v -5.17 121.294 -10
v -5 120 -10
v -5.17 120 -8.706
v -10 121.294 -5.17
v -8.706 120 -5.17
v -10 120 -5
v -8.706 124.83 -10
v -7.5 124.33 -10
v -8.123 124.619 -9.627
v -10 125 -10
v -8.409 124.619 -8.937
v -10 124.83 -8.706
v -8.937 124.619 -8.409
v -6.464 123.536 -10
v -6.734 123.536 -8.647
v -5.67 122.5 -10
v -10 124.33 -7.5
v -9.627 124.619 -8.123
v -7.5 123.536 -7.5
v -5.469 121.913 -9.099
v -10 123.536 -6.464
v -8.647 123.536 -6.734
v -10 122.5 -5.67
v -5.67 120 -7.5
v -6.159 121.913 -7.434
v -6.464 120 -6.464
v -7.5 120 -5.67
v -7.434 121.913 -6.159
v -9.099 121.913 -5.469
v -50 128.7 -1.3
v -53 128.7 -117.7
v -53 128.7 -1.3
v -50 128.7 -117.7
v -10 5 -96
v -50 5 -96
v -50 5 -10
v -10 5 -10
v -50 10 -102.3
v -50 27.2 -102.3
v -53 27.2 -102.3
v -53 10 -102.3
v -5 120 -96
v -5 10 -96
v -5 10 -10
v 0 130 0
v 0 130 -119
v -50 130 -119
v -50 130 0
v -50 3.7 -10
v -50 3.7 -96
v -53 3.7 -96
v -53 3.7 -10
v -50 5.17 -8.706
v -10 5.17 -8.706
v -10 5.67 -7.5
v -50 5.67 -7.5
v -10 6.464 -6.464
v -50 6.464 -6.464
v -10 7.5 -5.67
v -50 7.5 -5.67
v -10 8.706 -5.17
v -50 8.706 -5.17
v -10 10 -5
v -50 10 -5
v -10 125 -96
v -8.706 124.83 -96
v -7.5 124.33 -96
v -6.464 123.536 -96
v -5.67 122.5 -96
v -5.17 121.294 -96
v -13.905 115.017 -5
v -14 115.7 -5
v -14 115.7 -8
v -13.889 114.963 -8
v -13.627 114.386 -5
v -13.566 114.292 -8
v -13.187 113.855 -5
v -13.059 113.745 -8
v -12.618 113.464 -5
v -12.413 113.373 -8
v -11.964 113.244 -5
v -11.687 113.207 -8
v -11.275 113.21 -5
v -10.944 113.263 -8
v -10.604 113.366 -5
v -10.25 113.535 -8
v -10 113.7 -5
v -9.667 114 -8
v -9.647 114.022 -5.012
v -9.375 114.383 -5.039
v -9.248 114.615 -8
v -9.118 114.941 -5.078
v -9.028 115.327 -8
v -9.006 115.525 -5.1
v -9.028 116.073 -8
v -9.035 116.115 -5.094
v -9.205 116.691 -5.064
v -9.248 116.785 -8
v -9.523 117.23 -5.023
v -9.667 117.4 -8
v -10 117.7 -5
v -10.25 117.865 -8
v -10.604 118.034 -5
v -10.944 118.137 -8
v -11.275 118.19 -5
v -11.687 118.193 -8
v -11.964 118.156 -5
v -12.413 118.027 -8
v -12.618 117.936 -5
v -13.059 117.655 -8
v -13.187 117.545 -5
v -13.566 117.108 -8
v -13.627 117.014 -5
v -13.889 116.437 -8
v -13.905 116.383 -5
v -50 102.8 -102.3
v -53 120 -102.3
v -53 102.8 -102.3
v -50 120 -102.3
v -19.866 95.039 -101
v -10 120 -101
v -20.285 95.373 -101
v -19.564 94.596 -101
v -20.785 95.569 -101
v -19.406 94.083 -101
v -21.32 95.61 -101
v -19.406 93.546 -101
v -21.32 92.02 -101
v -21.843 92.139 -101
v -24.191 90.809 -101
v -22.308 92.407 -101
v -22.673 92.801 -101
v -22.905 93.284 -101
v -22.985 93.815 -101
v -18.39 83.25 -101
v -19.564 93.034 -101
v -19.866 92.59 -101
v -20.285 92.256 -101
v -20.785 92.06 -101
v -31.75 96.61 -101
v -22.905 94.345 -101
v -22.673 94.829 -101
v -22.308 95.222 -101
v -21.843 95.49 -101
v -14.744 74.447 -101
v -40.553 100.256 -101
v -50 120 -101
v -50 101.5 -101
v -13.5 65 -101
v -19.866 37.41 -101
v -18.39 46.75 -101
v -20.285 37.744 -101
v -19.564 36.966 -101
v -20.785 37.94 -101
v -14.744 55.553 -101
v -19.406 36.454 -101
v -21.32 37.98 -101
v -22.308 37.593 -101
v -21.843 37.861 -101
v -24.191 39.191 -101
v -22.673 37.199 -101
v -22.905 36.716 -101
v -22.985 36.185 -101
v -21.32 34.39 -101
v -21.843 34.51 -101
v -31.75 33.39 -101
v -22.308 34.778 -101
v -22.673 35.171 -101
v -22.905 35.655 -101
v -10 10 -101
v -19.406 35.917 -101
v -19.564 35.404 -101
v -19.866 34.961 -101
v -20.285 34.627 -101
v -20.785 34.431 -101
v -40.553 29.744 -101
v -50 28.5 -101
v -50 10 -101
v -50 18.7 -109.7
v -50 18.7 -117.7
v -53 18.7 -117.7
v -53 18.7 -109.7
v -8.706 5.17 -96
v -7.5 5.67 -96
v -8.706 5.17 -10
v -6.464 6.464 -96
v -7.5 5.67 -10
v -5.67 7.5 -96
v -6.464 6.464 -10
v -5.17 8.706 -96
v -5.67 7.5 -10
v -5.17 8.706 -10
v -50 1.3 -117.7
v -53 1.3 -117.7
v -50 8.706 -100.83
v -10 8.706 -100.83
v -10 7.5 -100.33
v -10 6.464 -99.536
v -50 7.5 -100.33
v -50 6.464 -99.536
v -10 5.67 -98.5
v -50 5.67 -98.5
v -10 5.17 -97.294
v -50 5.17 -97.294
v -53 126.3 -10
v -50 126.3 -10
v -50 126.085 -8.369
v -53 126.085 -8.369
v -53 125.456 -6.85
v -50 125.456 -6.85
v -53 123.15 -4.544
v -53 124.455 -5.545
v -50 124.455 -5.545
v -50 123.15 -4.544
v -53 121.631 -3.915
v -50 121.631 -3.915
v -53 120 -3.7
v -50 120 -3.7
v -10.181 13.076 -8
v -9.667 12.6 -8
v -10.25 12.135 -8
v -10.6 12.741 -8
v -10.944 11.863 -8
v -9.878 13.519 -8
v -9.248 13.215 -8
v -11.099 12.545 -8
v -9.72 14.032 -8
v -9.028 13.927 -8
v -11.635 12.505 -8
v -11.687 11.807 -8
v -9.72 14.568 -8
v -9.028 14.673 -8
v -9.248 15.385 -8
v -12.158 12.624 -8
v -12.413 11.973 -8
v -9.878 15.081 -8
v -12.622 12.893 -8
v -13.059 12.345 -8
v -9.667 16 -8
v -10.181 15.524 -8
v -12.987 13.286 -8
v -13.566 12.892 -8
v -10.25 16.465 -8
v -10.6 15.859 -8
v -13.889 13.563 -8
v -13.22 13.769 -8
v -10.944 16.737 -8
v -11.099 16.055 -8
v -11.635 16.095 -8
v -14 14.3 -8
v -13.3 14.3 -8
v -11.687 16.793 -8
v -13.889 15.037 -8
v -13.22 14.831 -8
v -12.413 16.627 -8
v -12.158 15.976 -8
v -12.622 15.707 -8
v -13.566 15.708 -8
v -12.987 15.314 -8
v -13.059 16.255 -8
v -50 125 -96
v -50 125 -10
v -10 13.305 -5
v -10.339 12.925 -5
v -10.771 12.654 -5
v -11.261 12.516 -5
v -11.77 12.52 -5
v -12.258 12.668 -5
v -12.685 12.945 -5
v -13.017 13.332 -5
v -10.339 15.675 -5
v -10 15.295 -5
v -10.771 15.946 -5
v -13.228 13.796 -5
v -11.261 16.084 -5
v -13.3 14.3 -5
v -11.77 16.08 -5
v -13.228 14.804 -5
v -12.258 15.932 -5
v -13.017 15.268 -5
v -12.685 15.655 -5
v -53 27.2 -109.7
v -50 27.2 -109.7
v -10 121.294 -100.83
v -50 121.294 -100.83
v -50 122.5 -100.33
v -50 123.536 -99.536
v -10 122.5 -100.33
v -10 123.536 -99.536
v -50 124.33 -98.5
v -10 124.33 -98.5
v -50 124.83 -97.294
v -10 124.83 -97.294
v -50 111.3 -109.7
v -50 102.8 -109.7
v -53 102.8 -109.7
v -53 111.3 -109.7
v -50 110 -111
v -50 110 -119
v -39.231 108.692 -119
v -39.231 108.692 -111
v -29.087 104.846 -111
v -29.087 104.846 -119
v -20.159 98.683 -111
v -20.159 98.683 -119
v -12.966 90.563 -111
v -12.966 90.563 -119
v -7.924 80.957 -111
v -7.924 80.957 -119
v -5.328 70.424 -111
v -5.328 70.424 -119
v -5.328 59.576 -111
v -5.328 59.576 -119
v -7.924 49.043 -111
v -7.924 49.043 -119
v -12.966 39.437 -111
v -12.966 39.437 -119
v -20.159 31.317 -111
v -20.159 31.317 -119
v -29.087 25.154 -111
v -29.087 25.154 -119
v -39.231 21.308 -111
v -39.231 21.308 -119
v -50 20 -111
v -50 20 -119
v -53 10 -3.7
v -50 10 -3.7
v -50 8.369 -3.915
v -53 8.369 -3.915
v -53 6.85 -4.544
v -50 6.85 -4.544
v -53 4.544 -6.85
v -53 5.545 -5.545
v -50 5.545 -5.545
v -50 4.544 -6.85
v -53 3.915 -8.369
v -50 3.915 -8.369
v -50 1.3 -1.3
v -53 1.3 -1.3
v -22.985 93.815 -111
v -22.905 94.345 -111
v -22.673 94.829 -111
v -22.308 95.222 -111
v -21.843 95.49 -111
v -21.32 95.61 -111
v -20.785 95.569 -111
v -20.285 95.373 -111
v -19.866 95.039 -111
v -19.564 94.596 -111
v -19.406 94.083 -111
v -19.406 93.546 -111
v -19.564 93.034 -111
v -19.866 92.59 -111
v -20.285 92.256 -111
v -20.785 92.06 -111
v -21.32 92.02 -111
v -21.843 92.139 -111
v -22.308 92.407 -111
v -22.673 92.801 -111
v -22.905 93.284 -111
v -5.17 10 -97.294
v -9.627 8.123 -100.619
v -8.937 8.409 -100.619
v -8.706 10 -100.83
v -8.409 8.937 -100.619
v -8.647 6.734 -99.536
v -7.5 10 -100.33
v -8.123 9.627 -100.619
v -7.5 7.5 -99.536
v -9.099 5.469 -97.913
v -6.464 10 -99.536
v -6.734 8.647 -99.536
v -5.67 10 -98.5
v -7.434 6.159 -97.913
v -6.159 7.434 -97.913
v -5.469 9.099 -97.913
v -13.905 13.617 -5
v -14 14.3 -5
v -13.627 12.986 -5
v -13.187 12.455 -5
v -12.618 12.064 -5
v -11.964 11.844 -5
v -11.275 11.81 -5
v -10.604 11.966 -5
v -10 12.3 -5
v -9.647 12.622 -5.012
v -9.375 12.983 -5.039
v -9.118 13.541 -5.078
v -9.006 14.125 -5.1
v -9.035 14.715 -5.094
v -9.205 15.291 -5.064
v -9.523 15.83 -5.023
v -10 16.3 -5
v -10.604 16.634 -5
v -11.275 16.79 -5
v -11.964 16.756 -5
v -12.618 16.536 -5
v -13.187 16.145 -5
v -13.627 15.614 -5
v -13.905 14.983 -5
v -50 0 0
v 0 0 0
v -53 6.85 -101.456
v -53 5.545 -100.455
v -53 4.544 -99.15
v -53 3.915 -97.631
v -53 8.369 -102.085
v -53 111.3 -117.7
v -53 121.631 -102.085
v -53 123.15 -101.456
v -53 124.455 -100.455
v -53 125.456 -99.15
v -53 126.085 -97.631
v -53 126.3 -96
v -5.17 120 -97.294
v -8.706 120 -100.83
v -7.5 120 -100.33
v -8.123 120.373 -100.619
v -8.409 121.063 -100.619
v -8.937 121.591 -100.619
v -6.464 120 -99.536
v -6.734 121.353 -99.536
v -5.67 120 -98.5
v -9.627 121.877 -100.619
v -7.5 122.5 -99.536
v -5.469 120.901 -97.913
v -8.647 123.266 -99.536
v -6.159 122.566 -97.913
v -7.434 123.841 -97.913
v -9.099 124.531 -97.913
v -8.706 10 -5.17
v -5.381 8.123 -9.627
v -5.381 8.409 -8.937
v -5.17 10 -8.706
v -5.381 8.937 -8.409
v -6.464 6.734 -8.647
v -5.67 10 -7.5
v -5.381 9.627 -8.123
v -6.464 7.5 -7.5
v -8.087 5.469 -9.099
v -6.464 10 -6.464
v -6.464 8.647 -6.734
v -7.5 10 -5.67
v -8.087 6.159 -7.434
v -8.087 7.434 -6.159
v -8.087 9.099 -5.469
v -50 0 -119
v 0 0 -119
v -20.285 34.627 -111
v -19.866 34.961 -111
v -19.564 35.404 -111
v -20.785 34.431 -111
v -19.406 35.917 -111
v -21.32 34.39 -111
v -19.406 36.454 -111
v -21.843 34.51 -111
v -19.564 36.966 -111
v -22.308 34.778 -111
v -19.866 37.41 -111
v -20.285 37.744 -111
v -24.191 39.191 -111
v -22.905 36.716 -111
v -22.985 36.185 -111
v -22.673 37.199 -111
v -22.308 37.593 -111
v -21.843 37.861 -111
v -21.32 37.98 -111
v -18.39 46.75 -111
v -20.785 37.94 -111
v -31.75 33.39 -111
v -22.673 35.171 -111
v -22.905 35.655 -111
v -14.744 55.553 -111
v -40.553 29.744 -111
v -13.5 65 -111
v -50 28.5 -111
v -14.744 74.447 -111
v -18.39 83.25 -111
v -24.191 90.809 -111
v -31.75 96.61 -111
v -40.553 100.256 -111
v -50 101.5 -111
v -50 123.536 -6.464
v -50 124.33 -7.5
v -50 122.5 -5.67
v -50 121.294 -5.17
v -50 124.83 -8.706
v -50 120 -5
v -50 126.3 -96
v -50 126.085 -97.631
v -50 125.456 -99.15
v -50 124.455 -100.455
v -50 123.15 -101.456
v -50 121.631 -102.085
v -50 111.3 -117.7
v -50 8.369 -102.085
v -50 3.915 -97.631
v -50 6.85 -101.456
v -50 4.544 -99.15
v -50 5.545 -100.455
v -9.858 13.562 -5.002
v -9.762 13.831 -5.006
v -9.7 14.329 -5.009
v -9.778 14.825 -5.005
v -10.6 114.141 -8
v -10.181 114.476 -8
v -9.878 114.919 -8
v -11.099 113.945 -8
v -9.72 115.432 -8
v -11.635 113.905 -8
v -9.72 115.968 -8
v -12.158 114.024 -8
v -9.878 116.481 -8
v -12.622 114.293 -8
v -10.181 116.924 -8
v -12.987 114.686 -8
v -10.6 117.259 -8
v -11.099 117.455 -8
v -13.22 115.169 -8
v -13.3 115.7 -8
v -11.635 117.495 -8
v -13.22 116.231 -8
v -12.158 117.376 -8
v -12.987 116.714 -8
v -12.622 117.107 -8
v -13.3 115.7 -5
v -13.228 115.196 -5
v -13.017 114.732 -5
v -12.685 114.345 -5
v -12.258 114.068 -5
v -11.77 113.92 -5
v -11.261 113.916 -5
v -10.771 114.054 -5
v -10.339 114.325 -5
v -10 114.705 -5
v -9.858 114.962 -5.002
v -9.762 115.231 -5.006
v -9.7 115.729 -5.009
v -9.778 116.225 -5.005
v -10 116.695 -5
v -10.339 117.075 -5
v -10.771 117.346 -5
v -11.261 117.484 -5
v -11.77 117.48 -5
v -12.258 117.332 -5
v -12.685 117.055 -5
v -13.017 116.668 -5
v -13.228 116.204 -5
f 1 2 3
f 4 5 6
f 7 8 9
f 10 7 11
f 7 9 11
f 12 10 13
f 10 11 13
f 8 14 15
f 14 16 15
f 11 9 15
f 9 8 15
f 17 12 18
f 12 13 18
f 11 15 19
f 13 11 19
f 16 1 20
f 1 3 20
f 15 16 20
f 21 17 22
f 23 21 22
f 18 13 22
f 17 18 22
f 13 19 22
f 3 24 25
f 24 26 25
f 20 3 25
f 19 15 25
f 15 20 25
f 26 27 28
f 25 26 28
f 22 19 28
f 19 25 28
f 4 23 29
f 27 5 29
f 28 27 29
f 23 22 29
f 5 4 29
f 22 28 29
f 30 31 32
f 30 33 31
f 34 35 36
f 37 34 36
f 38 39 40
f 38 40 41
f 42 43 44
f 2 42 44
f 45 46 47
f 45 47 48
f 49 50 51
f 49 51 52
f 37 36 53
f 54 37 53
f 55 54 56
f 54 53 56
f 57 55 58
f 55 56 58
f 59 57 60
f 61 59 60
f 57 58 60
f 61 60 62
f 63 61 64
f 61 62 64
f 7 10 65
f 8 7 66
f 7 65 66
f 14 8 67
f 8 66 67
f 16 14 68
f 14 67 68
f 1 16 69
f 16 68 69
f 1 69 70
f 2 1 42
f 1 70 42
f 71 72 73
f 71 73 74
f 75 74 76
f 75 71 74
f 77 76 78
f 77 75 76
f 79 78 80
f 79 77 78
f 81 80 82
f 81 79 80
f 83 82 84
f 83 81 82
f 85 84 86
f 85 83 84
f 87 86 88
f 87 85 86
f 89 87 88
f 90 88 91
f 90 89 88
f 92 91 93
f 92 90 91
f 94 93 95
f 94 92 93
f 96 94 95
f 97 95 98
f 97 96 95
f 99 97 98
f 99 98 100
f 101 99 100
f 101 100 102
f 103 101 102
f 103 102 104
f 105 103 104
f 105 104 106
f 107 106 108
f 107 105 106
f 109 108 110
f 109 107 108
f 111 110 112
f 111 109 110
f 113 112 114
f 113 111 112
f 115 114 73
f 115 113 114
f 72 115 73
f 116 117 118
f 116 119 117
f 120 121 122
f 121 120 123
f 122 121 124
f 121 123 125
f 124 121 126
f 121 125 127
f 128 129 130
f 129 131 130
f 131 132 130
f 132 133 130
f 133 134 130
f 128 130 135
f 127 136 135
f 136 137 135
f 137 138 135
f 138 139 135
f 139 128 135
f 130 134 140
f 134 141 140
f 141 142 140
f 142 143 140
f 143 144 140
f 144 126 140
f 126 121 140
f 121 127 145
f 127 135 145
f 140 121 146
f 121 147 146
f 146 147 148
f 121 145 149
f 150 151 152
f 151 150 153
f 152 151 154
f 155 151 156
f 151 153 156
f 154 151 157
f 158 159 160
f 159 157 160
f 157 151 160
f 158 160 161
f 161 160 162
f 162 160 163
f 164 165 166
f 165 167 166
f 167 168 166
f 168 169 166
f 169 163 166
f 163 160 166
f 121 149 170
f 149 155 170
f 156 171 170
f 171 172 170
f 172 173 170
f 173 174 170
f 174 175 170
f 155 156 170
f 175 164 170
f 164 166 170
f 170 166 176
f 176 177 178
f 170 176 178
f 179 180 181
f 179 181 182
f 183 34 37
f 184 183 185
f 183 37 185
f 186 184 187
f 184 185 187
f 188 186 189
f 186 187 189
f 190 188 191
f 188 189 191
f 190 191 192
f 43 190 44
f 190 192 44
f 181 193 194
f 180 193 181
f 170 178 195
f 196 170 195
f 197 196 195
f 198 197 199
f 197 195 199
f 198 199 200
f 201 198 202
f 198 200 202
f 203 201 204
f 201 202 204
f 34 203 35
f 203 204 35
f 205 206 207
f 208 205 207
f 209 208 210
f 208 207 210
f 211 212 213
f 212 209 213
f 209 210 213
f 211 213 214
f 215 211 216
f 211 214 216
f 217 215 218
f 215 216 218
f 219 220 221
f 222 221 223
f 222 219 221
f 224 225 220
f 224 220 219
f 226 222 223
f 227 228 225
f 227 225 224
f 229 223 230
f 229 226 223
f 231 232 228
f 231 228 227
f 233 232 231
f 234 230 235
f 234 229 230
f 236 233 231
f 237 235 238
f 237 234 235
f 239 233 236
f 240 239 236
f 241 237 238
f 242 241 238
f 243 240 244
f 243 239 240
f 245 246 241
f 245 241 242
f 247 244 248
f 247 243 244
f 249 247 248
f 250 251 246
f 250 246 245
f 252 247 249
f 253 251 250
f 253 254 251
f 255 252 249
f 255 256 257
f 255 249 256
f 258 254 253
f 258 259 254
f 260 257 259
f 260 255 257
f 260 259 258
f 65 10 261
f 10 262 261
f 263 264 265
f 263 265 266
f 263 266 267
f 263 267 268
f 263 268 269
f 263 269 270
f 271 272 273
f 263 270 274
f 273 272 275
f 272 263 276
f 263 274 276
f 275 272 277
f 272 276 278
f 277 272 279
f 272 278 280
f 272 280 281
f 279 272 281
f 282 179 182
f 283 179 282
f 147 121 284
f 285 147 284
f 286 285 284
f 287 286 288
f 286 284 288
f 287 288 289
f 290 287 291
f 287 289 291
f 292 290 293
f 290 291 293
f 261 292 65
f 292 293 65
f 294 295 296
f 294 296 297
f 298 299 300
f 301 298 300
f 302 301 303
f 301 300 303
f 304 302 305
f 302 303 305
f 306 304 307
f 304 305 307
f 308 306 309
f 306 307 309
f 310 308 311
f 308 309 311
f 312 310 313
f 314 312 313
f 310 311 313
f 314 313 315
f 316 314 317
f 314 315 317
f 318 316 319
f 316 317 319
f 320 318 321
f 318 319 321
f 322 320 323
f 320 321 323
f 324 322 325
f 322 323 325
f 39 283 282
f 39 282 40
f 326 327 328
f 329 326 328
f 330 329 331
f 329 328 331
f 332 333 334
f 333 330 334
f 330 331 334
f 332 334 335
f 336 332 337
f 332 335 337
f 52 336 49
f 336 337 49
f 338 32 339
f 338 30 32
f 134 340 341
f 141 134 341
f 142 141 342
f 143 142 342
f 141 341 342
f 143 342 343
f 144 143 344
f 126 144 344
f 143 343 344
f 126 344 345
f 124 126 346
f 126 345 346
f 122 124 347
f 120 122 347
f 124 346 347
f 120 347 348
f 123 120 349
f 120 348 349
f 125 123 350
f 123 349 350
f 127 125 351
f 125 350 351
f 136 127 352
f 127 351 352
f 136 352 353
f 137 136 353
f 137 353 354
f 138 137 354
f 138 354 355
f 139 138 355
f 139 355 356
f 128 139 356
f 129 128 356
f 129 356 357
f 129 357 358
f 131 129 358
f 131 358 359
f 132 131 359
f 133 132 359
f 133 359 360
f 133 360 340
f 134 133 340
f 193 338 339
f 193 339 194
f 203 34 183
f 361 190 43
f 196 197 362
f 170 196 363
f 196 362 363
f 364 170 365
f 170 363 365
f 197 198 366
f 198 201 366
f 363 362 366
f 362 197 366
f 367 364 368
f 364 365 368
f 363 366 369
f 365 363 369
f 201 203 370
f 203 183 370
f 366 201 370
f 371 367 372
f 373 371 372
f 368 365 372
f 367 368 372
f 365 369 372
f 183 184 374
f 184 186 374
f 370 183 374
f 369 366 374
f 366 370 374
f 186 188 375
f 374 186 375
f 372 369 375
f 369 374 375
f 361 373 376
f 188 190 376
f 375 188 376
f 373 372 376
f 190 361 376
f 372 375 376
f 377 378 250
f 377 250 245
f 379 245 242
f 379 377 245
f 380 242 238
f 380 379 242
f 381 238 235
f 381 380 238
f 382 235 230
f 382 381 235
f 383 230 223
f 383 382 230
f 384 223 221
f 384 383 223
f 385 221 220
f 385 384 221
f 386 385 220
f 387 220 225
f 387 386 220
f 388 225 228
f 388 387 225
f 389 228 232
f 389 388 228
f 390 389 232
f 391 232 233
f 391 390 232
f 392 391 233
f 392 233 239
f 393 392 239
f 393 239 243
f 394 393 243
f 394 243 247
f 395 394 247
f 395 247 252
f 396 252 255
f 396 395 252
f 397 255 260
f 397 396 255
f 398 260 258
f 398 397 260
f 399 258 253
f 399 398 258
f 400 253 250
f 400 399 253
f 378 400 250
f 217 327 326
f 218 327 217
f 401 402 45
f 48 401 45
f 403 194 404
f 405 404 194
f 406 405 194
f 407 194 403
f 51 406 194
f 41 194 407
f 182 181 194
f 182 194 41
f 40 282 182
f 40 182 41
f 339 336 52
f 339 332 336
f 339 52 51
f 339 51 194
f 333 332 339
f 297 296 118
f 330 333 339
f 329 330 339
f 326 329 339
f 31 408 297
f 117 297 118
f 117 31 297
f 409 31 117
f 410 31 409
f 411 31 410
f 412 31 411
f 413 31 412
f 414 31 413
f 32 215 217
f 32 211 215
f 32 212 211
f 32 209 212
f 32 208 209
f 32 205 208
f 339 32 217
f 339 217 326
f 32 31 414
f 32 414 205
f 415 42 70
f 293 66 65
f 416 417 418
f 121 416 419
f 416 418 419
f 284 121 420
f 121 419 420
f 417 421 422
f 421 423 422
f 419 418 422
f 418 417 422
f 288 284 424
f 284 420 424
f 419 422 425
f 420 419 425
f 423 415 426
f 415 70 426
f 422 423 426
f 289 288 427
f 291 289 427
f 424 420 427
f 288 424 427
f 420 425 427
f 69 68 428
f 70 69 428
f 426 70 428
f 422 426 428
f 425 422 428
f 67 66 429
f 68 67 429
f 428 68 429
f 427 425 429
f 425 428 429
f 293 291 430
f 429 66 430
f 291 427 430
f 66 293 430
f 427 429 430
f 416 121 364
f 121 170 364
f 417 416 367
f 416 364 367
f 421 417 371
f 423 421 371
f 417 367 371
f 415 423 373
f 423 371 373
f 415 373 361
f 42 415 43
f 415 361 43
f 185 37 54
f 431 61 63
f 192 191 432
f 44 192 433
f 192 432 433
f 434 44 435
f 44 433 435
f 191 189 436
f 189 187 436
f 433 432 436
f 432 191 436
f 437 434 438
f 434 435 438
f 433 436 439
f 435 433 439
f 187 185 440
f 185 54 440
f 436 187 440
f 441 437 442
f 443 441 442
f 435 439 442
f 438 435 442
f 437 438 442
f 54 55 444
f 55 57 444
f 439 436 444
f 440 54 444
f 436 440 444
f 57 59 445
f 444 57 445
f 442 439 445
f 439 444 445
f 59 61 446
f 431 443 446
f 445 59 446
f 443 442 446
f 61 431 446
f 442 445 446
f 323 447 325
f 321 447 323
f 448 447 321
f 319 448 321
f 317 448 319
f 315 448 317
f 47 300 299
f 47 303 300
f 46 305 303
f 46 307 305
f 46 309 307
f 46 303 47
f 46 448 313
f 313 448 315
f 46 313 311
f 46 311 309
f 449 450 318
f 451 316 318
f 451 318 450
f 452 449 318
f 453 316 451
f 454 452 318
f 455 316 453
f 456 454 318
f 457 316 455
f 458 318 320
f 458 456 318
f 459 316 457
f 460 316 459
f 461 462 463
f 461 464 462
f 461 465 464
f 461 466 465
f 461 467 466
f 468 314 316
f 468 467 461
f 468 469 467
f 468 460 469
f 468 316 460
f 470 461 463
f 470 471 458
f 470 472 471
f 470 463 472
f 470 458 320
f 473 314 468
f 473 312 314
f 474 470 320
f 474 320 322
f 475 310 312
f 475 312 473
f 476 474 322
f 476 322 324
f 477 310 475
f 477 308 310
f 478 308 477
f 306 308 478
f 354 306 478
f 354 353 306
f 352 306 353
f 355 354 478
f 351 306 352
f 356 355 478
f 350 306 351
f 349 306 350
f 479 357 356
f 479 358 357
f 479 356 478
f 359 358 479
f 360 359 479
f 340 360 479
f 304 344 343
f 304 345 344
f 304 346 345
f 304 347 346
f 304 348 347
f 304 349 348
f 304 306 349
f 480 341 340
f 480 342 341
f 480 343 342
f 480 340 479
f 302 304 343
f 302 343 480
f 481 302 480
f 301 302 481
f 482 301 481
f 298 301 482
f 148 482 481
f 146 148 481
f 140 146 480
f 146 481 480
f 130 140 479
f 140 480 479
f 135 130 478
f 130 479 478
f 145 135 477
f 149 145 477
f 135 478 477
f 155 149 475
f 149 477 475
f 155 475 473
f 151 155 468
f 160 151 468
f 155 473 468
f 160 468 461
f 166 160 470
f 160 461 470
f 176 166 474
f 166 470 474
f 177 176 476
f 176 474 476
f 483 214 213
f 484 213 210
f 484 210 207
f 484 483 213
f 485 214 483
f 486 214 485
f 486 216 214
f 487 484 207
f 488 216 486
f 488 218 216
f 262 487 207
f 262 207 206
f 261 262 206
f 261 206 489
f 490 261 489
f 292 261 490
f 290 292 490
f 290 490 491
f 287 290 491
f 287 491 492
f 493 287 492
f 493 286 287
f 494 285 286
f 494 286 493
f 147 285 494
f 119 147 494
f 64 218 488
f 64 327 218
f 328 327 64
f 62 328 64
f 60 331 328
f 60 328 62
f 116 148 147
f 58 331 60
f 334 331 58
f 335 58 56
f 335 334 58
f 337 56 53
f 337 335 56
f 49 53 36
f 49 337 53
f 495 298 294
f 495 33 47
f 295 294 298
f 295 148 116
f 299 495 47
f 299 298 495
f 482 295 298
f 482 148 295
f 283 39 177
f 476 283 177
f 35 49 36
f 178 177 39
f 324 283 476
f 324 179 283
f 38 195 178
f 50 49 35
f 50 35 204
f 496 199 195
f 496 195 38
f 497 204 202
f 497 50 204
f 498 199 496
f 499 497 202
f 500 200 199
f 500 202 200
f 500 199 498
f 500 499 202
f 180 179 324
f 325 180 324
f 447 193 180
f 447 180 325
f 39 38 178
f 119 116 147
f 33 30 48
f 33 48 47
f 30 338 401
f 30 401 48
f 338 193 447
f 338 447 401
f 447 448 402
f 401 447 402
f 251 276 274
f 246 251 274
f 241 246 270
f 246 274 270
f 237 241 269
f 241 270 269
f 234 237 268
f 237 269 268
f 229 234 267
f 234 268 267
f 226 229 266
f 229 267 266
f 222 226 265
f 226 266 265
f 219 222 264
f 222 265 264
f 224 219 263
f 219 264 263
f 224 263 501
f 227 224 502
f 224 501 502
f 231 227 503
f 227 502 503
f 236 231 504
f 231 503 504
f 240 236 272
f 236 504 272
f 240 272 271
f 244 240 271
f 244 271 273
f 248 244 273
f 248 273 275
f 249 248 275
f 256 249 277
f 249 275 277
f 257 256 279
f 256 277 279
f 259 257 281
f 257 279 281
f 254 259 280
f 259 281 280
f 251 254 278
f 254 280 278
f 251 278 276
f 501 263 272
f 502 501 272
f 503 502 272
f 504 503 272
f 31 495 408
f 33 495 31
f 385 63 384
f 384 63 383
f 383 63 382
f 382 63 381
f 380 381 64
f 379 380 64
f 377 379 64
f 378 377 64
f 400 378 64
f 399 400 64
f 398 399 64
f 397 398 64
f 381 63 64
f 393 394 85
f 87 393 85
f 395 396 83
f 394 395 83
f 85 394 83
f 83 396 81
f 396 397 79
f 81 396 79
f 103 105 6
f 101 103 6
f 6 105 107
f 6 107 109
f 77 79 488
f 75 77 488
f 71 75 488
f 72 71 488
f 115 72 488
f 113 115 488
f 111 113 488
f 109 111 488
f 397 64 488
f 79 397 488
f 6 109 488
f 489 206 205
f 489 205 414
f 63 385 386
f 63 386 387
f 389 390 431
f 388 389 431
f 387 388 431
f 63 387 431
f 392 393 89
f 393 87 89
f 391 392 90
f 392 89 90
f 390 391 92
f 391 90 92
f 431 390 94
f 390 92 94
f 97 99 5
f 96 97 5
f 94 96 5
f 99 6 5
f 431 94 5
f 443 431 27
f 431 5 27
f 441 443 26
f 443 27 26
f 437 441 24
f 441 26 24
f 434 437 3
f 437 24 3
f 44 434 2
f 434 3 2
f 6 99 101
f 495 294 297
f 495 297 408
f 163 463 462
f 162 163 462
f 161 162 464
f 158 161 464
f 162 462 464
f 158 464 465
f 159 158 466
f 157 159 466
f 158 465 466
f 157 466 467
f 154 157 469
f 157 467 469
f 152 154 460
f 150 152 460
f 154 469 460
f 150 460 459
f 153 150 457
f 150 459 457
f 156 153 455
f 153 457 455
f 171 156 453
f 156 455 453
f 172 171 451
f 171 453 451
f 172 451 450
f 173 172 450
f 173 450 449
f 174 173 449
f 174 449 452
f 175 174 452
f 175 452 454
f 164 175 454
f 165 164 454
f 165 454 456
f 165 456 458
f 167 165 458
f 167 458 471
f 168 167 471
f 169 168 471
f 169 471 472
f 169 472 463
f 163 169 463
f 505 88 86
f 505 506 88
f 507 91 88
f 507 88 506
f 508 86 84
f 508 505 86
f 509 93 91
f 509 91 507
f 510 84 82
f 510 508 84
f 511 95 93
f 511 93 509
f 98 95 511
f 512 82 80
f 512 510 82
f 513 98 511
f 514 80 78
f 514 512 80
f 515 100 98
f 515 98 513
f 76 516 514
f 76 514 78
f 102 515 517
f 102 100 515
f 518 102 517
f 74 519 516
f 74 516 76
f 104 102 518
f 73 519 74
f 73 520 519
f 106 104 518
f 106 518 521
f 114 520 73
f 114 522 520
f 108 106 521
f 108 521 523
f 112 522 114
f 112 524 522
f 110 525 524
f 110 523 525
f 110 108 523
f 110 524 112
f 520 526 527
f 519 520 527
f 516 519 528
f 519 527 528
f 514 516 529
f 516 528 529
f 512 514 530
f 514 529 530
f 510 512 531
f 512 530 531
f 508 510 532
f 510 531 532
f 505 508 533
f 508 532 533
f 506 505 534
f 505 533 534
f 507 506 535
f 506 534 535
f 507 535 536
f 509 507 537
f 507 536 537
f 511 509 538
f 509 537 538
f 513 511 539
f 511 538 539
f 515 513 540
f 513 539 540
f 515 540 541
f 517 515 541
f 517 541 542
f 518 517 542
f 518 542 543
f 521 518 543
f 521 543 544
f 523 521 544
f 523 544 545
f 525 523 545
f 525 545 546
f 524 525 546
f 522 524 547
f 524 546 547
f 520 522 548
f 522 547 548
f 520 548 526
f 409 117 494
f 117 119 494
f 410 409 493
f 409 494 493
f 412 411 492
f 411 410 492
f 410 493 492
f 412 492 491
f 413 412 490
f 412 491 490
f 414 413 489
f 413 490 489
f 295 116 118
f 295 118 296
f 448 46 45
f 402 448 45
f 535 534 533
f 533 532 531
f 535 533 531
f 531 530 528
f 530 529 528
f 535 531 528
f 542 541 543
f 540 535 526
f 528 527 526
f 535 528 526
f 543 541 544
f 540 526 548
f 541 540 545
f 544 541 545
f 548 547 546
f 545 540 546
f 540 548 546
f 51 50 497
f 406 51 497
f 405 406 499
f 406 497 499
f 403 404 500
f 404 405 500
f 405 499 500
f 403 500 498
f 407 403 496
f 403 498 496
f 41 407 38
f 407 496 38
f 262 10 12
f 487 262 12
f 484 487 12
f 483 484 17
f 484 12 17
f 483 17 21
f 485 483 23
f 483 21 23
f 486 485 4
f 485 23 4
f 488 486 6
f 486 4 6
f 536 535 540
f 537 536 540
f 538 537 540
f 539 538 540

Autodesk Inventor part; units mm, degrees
ref_plane "YZ Plane" through (0, 0, 0) normal (1, 0, 0) x (0, 1, 0)
sketch "Sketch1" plane through (0, 0, 0) normal (0, 1, 0) x (-1, 0, 0)
  line L0 (0, 0) -> (100, 0)
  line L1 (100, 0) -> (100, -119)
  line L2 (100, -119) -> (0, -119)
  line L3 (0, -119) -> (0, 0)
  dimension "d0" = 119
  dimension "d1" = 100
extrude "Extrusion1" add sketch "Sketch1" along normal blind 130
sketch "Sketch2" plane through (0, 0, -119) normal (0, 0, -1) x (-1, 0, 0)
  circle A0 centre (50, 65) radius 45
  line L0 (100, 0) -> (100, 130) projected
  line L1 (0, 0) -> (0, 130) projected
  line L2 (0, 0) -> (100, 0) projected
  line L3 (0, 130) -> (100, 130) projected
  circle A1 centre (50, 65) radius 36.5
  circle A2 centre (28.0236, 99.1226) radius 1.9
  line L4 (25.6342, 102.8326) -> (74.3658, 27.1674) construction
  line L5 (12.1674, 40.6342) -> (87.8326, 89.3658) construction
  dimension "d6" = 90
  dimension "d7" = 100
  dimension "d8" = 50
  dimension "d9" = 65
  dimension "d10" = 130
  dimension "d11" = 73
  dimension "d12" = 3.8
extrude "Extrusion2" cut sketch "Sketch2" against normal blind 8 contours A0 | A1 | A2
extrude "Extrusion3" cut sketch "Sketch2" against normal blind 18 contours A1
ref_plane "Work Plane1" through (-95, 0, -119) normal (-1, 0, 0) x (0, 0, 1)
sketch "Sketch3" plane through (-95, 0, -119) normal (-1, 0, 0) x (0, 0, 1)
  line L0 (18, 28.5) -> (18, 101.5) projected
  line L1 (119, 130) -> (119, 0) projected
  line L2 (119, 0) -> (0, 0) projected
  line L3 (0, 0) -> (0, 65) projected
  line L4 (8, 65) -> (0, 65) projected
  line L5 (0, 130) -> (119, 130) projected
  line L6 (0, 65) -> (0, 130) projected
  line L7 (114, 125) -> (18, 125)
  line L8 (18, 125) -> (18, 5)
  line L9 (18, 5) -> (114, 5)
  line L10 (114, 5) -> (114, 125)
  dimension "d16" = 5
  dimension "d17" = 5
  dimension "d18" = 5
extrude "Extrusion4" cut sketch "Sketch3" against normal blind 90 and the other way blind 90 contours L0 L8 L7 L10 L9
fillet "Fillet1" radius 5 8 edges at (-52.5, 5, -5) (-5, 5, -53) (-5, 65, -5) (-5, 125, -53) (-52.5, 125, -5) (-52.5, 5, -101) (-52.5, 125, -101) (-5, 65, -101)
sketch "Sketch8" plane through (-100, 0, -119) normal (-1, 0, 0) x (0, 0, 1)
  point P0 (119, 0)
sketch "Sketch10" plane through (-100, 0, -119) normal (-1, 0, 0) x (0, 0, 1)
  line L0 (0, 0) -> (119, 0) projected
  line L1 (119, 0) -> (119, 130) projected
  line L2 (0, 130) -> (119, 130) projected
  line L3 (0, 0) -> (0, 130) projected
extrude "Extrusion10" add sketch "Sketch10" along normal blind 5
sketch "Sketch12" plane through (0, 130, 0) normal (0, 1, 0) x (1, 0, 0)
  line L0 (0, 119) -> (-105, 119) projected
  line L1 (-105, 0) -> (-105, 119) projected
  line L2 (0, 0) -> (-105, 0) projected
  line L3 (0, 0) -> (0, 119) projected
  line L4 (-105, 0) -> (-100, 0)
  line L5 (-100, 0) -> (-100, 119)
  line L6 (-100, 119) -> (-105, 119)
  line L7 (-105, 119) -> (-105, 0)
  line L8 (-100, 20) -> (-105, 25)
  line L9 (-105, 40) -> (-100, 45)
  line L10 (-105, 94) -> (-100, 99)
  line L11 (-100, 74) -> (-105, 79)
  dimension "d82" = 119
  dimension "d86" = 5
  dimension "d87" = 45
  dimension "d88" = 45
  dimension "d90" = 45
  dimension "d91" = 45
  dimension "d92" = 20
  dimension "d93" = 25
  dimension "d94" = 20
  dimension "d95" = 25
extrude "Extrusion11" cut sketch "Sketch12" against normal blind 127 contours L5 L11 L1 L10 | L8 L1 L9 L5
fillet "Fillet2" radius 1 8 edges at (-105, 66.5, -25) (-100, 127.5, -20) (-105, 66.5, -40) (-100, 127.5, -45) (-105, 66.5, -79) (-100, 127.5, -74) (-105, 66.5, -94) (-100, 127, -99)
sketch "Sketch13" plane through (-10, 120, -5) normal (0, 0, -1) x (-1, 0, 0)
  line L0 (82.5, 0) -> (-2.5, 0)
  line L1 (-2.5, 0) -> (-2.5, -110)
  line L2 (-2.5, -110) -> (82.5, -110)
  line L3 (82.5, -110) -> (82.5, 0)
  line L4 (-5, 0) -> (-5, -110) projected
  line L5 (85, -110) -> (85, 0) projected
  circle A0 centre (78.5, -4.3) radius 1.8
  circle A1 centre (78.5, -4.3) radius 2.5
  line L6 (78.5, -4.3) -> (78.5, -140.0823) construction
  line L7 (78.5, -4.3) -> (-34.9987, -4.3) construction
  line L8 (1.5, 27.6777) -> (1.5, -220.2724) construction
  line L9 (-45.8754, -105.7) -> (99.6232, -105.7) construction
  line L10 (80, 5) -> (0, 5) construction
  line L11 (0, -115) -> (80, -115) construction
  circle A2 centre (78.5, -105.7) radius 1.8
  circle A3 centre (78.5, -105.7) radius 2.5
  circle A4 centre (1.5, -105.7) radius 1.8
  circle A5 centre (1.5, -105.7) radius 2.5
  circle A6 centre (1.5, -4.3) radius 1.8
  circle A7 centre (1.5, -4.3) radius 2.5
  point P0 (-10, -120)
  dimension "d97" = 85
  dimension "d98" = 110
  dimension "d99" = 90
  dimension "d100" = 2.5
  dimension "d101" = 4
  dimension "d102" = 4.3
  dimension "d103" = 3.6
  dimension "d104" = 5
  dimension "d105" = 4.3
  dimension "d107" = 120
  dimension "d108" = 5
  dimension "d109" = 4
  dimension "d110" = 3.6
  dimension "d111" = 5
  dimension "d112" = 3.6
  dimension "d113" = 5
  dimension "d114" = 3.6
  dimension "d115" = 5
extrude "Extrusion12" add sketch "Sketch13" along normal blind 3 contours A1 | A3 | A5 | A7
sketch "Sketch14" plane through (-105, 0, -119) normal (-1, 0, 0) x (0, 0, 1)
  line L0 (19.5, 52) -> (19.5, 34) construction
  line L1 (18, 52) -> (18, 34)
  line L2 (21, 34) -> (21, 52)
  arc A0 (21, 52) -> (18, 52) centre (19.5, 52) ccw
  arc A1 (18, 34) -> (21, 34) centre (19.5, 34) ccw
  line L3 (0, 130) -> (0, 0) projected
  line L4 (0, 0) -> (119, 0) projected
  point P0 (19.5, 43)
  dimension "d118" = 18
  dimension "d119" = 3
  dimension "d121" = 18
  dimension "d122" = 34
extrude "Extrusion13" cut sketch "Sketch14" against normal blind 20
sketch "Sketch15" plane through (-50, 65, -111) normal (0, 0, -1) x (-1, 0, 0)
  circle A0 centre (0, 0) radius 45 construction
  line L0 (31.8198, 31.8198) -> (-31.8198, -31.8198) construction
  line L1 (31.8198, -31.8198) -> (-31.8198, 31.8198) construction
  circle A1 centre (0, 0) radius 36.5 construction
  circle A2 centre (0, 0) radius 40.75 construction
  line L2 (0, -45) -> (0, 45) construction
  line L3 (-40, -60) -> (40, -60) construction
  circle A3 centre (28.8146, 28.8146) radius 1.8
  circle A4 centre (-28.8146, 28.8146) radius 1.8
  circle A5 centre (28.8146, -28.8146) radius 1.8
  circle A6 centre (-28.8146, -28.8146) radius 1.8
  point P0 (-50, -65)
  dimension "d125" = 45
  dimension "d126" = 73
  dimension "d129" = 90
  dimension "d130" = 4.25
  dimension "d131" = 3.6
  dimension "d135" = 3.6
  dimension "d136" = 3.6
  dimension "d137" = 3.6
extrude "Extrusion14" cut sketch "Sketch15" against normal blind 40
ref_plane "Work Plane2" through (-50, 0, -119) normal (-1, 0, 0) x (0, 0, 1)
split "Split1" plane through (-50, 0, -119) removes the side toward (-1, 0, 0)
sketch "Sketch18" plane through (-50, 0, -119) normal (-1, 0, 0) x (0, 0, 1)
  line L0 (8, 110) -> (0, 110) projected
  line L1 (8, 101.5) -> (8, 110) projected
  line L2 (18, 101.5) -> (8, 101.5) projected
  line L3 (18, 120) -> (18, 101.5) projected
  arc A0 (23, 125) -> (18, 120) centre (23, 120) ccw projected
  line L4 (109, 125) -> (23, 125) projected
  arc A1 (114, 120) -> (109, 125) centre (109, 120) ccw projected
  line L5 (114, 10) -> (114, 120) projected
  arc A2 (109, 5) -> (114, 10) centre (109, 10) ccw projected
  line L6 (23, 5) -> (109, 5) projected
  arc A3 (18, 10) -> (23, 5) centre (23, 10) ccw projected
  line L7 (18, 28.5) -> (18, 10) projected
  line L8 (8, 28.5) -> (18, 28.5) projected
  line L9 (8, 20) -> (8, 28.5) projected
  line L10 (0, 20) -> (8, 20) projected
  line L11 (0, 0) -> (0, 20) projected
  line L12 (119, 0) -> (0, 0) projected
  line L13 (119, 130) -> (119, 0) projected
  line L14 (0, 130) -> (119, 130) projected
  line L15 (0, 110) -> (0, 130) projected
  line L16 (117.7, 1.3) -> (1.3, 1.3)
  line L17 (1.3, 1.3) -> (1.3, 18.7)
  line L18 (1.3, 18.7) -> (9.3, 18.7)
  line L19 (9.3, 18.7) -> (9.3, 27.2)
  line L20 (9.3, 27.2) -> (16.7, 27.2)
  line L21 (16.7, 27.2) -> (16.7, 10)
  arc A4 (16.7, 10) -> (23, 3.7) centre (23, 10) ccw
  line L22 (23, 3.7) -> (109, 3.7)
  arc A5 (109, 3.7) -> (115.3, 10) centre (109, 10) ccw
  line L23 (115.3, 10) -> (115.3, 120)
  arc A6 (115.3, 120) -> (109, 126.3) centre (109, 120) ccw
  line L24 (109, 126.3) -> (23, 126.3)
  arc A7 (23, 126.3) -> (16.7, 120) centre (23, 120) ccw
  line L25 (16.7, 120) -> (16.7, 102.8)
  line L26 (16.7, 102.8) -> (9.3, 102.8)
  line L27 (9.3, 102.8) -> (9.3, 111.3)
  line L28 (9.3, 111.3) -> (1.3, 111.3)
  line L29 (1.3, 111.3) -> (1.3, 128.7)
  line L30 (1.3, 128.7) -> (117.7, 128.7)
  line L31 (117.7, 128.7) -> (117.7, 1.3)
  dimension "d140" = 1.3
extrude "Extrusion15" add sketch "Sketch18" along normal blind 3 contours L16 L17 L18 L19 L20 L21 A4 L22 A5 L23 A6 L24 A7 L25 L26 L27 L28 L29 L30 L31
equation "\"d8\" = 0.5 * d7"
equation "\"d9\" = 0.5 * d10"
equation "\"d100\" = -0.5 * d97 + 0.5 * d99"
equation "\"d108\" = -0.5 * d98 + 0.5 * d107"
equation "\"d130\" = -0.25 * d126 + 0.25 * d129"
equation "\"d135\" = d131"
equation "\"d136\" = d131"
equation "\"d137\" = d131"
properties part number "wooferBoxTongue"
